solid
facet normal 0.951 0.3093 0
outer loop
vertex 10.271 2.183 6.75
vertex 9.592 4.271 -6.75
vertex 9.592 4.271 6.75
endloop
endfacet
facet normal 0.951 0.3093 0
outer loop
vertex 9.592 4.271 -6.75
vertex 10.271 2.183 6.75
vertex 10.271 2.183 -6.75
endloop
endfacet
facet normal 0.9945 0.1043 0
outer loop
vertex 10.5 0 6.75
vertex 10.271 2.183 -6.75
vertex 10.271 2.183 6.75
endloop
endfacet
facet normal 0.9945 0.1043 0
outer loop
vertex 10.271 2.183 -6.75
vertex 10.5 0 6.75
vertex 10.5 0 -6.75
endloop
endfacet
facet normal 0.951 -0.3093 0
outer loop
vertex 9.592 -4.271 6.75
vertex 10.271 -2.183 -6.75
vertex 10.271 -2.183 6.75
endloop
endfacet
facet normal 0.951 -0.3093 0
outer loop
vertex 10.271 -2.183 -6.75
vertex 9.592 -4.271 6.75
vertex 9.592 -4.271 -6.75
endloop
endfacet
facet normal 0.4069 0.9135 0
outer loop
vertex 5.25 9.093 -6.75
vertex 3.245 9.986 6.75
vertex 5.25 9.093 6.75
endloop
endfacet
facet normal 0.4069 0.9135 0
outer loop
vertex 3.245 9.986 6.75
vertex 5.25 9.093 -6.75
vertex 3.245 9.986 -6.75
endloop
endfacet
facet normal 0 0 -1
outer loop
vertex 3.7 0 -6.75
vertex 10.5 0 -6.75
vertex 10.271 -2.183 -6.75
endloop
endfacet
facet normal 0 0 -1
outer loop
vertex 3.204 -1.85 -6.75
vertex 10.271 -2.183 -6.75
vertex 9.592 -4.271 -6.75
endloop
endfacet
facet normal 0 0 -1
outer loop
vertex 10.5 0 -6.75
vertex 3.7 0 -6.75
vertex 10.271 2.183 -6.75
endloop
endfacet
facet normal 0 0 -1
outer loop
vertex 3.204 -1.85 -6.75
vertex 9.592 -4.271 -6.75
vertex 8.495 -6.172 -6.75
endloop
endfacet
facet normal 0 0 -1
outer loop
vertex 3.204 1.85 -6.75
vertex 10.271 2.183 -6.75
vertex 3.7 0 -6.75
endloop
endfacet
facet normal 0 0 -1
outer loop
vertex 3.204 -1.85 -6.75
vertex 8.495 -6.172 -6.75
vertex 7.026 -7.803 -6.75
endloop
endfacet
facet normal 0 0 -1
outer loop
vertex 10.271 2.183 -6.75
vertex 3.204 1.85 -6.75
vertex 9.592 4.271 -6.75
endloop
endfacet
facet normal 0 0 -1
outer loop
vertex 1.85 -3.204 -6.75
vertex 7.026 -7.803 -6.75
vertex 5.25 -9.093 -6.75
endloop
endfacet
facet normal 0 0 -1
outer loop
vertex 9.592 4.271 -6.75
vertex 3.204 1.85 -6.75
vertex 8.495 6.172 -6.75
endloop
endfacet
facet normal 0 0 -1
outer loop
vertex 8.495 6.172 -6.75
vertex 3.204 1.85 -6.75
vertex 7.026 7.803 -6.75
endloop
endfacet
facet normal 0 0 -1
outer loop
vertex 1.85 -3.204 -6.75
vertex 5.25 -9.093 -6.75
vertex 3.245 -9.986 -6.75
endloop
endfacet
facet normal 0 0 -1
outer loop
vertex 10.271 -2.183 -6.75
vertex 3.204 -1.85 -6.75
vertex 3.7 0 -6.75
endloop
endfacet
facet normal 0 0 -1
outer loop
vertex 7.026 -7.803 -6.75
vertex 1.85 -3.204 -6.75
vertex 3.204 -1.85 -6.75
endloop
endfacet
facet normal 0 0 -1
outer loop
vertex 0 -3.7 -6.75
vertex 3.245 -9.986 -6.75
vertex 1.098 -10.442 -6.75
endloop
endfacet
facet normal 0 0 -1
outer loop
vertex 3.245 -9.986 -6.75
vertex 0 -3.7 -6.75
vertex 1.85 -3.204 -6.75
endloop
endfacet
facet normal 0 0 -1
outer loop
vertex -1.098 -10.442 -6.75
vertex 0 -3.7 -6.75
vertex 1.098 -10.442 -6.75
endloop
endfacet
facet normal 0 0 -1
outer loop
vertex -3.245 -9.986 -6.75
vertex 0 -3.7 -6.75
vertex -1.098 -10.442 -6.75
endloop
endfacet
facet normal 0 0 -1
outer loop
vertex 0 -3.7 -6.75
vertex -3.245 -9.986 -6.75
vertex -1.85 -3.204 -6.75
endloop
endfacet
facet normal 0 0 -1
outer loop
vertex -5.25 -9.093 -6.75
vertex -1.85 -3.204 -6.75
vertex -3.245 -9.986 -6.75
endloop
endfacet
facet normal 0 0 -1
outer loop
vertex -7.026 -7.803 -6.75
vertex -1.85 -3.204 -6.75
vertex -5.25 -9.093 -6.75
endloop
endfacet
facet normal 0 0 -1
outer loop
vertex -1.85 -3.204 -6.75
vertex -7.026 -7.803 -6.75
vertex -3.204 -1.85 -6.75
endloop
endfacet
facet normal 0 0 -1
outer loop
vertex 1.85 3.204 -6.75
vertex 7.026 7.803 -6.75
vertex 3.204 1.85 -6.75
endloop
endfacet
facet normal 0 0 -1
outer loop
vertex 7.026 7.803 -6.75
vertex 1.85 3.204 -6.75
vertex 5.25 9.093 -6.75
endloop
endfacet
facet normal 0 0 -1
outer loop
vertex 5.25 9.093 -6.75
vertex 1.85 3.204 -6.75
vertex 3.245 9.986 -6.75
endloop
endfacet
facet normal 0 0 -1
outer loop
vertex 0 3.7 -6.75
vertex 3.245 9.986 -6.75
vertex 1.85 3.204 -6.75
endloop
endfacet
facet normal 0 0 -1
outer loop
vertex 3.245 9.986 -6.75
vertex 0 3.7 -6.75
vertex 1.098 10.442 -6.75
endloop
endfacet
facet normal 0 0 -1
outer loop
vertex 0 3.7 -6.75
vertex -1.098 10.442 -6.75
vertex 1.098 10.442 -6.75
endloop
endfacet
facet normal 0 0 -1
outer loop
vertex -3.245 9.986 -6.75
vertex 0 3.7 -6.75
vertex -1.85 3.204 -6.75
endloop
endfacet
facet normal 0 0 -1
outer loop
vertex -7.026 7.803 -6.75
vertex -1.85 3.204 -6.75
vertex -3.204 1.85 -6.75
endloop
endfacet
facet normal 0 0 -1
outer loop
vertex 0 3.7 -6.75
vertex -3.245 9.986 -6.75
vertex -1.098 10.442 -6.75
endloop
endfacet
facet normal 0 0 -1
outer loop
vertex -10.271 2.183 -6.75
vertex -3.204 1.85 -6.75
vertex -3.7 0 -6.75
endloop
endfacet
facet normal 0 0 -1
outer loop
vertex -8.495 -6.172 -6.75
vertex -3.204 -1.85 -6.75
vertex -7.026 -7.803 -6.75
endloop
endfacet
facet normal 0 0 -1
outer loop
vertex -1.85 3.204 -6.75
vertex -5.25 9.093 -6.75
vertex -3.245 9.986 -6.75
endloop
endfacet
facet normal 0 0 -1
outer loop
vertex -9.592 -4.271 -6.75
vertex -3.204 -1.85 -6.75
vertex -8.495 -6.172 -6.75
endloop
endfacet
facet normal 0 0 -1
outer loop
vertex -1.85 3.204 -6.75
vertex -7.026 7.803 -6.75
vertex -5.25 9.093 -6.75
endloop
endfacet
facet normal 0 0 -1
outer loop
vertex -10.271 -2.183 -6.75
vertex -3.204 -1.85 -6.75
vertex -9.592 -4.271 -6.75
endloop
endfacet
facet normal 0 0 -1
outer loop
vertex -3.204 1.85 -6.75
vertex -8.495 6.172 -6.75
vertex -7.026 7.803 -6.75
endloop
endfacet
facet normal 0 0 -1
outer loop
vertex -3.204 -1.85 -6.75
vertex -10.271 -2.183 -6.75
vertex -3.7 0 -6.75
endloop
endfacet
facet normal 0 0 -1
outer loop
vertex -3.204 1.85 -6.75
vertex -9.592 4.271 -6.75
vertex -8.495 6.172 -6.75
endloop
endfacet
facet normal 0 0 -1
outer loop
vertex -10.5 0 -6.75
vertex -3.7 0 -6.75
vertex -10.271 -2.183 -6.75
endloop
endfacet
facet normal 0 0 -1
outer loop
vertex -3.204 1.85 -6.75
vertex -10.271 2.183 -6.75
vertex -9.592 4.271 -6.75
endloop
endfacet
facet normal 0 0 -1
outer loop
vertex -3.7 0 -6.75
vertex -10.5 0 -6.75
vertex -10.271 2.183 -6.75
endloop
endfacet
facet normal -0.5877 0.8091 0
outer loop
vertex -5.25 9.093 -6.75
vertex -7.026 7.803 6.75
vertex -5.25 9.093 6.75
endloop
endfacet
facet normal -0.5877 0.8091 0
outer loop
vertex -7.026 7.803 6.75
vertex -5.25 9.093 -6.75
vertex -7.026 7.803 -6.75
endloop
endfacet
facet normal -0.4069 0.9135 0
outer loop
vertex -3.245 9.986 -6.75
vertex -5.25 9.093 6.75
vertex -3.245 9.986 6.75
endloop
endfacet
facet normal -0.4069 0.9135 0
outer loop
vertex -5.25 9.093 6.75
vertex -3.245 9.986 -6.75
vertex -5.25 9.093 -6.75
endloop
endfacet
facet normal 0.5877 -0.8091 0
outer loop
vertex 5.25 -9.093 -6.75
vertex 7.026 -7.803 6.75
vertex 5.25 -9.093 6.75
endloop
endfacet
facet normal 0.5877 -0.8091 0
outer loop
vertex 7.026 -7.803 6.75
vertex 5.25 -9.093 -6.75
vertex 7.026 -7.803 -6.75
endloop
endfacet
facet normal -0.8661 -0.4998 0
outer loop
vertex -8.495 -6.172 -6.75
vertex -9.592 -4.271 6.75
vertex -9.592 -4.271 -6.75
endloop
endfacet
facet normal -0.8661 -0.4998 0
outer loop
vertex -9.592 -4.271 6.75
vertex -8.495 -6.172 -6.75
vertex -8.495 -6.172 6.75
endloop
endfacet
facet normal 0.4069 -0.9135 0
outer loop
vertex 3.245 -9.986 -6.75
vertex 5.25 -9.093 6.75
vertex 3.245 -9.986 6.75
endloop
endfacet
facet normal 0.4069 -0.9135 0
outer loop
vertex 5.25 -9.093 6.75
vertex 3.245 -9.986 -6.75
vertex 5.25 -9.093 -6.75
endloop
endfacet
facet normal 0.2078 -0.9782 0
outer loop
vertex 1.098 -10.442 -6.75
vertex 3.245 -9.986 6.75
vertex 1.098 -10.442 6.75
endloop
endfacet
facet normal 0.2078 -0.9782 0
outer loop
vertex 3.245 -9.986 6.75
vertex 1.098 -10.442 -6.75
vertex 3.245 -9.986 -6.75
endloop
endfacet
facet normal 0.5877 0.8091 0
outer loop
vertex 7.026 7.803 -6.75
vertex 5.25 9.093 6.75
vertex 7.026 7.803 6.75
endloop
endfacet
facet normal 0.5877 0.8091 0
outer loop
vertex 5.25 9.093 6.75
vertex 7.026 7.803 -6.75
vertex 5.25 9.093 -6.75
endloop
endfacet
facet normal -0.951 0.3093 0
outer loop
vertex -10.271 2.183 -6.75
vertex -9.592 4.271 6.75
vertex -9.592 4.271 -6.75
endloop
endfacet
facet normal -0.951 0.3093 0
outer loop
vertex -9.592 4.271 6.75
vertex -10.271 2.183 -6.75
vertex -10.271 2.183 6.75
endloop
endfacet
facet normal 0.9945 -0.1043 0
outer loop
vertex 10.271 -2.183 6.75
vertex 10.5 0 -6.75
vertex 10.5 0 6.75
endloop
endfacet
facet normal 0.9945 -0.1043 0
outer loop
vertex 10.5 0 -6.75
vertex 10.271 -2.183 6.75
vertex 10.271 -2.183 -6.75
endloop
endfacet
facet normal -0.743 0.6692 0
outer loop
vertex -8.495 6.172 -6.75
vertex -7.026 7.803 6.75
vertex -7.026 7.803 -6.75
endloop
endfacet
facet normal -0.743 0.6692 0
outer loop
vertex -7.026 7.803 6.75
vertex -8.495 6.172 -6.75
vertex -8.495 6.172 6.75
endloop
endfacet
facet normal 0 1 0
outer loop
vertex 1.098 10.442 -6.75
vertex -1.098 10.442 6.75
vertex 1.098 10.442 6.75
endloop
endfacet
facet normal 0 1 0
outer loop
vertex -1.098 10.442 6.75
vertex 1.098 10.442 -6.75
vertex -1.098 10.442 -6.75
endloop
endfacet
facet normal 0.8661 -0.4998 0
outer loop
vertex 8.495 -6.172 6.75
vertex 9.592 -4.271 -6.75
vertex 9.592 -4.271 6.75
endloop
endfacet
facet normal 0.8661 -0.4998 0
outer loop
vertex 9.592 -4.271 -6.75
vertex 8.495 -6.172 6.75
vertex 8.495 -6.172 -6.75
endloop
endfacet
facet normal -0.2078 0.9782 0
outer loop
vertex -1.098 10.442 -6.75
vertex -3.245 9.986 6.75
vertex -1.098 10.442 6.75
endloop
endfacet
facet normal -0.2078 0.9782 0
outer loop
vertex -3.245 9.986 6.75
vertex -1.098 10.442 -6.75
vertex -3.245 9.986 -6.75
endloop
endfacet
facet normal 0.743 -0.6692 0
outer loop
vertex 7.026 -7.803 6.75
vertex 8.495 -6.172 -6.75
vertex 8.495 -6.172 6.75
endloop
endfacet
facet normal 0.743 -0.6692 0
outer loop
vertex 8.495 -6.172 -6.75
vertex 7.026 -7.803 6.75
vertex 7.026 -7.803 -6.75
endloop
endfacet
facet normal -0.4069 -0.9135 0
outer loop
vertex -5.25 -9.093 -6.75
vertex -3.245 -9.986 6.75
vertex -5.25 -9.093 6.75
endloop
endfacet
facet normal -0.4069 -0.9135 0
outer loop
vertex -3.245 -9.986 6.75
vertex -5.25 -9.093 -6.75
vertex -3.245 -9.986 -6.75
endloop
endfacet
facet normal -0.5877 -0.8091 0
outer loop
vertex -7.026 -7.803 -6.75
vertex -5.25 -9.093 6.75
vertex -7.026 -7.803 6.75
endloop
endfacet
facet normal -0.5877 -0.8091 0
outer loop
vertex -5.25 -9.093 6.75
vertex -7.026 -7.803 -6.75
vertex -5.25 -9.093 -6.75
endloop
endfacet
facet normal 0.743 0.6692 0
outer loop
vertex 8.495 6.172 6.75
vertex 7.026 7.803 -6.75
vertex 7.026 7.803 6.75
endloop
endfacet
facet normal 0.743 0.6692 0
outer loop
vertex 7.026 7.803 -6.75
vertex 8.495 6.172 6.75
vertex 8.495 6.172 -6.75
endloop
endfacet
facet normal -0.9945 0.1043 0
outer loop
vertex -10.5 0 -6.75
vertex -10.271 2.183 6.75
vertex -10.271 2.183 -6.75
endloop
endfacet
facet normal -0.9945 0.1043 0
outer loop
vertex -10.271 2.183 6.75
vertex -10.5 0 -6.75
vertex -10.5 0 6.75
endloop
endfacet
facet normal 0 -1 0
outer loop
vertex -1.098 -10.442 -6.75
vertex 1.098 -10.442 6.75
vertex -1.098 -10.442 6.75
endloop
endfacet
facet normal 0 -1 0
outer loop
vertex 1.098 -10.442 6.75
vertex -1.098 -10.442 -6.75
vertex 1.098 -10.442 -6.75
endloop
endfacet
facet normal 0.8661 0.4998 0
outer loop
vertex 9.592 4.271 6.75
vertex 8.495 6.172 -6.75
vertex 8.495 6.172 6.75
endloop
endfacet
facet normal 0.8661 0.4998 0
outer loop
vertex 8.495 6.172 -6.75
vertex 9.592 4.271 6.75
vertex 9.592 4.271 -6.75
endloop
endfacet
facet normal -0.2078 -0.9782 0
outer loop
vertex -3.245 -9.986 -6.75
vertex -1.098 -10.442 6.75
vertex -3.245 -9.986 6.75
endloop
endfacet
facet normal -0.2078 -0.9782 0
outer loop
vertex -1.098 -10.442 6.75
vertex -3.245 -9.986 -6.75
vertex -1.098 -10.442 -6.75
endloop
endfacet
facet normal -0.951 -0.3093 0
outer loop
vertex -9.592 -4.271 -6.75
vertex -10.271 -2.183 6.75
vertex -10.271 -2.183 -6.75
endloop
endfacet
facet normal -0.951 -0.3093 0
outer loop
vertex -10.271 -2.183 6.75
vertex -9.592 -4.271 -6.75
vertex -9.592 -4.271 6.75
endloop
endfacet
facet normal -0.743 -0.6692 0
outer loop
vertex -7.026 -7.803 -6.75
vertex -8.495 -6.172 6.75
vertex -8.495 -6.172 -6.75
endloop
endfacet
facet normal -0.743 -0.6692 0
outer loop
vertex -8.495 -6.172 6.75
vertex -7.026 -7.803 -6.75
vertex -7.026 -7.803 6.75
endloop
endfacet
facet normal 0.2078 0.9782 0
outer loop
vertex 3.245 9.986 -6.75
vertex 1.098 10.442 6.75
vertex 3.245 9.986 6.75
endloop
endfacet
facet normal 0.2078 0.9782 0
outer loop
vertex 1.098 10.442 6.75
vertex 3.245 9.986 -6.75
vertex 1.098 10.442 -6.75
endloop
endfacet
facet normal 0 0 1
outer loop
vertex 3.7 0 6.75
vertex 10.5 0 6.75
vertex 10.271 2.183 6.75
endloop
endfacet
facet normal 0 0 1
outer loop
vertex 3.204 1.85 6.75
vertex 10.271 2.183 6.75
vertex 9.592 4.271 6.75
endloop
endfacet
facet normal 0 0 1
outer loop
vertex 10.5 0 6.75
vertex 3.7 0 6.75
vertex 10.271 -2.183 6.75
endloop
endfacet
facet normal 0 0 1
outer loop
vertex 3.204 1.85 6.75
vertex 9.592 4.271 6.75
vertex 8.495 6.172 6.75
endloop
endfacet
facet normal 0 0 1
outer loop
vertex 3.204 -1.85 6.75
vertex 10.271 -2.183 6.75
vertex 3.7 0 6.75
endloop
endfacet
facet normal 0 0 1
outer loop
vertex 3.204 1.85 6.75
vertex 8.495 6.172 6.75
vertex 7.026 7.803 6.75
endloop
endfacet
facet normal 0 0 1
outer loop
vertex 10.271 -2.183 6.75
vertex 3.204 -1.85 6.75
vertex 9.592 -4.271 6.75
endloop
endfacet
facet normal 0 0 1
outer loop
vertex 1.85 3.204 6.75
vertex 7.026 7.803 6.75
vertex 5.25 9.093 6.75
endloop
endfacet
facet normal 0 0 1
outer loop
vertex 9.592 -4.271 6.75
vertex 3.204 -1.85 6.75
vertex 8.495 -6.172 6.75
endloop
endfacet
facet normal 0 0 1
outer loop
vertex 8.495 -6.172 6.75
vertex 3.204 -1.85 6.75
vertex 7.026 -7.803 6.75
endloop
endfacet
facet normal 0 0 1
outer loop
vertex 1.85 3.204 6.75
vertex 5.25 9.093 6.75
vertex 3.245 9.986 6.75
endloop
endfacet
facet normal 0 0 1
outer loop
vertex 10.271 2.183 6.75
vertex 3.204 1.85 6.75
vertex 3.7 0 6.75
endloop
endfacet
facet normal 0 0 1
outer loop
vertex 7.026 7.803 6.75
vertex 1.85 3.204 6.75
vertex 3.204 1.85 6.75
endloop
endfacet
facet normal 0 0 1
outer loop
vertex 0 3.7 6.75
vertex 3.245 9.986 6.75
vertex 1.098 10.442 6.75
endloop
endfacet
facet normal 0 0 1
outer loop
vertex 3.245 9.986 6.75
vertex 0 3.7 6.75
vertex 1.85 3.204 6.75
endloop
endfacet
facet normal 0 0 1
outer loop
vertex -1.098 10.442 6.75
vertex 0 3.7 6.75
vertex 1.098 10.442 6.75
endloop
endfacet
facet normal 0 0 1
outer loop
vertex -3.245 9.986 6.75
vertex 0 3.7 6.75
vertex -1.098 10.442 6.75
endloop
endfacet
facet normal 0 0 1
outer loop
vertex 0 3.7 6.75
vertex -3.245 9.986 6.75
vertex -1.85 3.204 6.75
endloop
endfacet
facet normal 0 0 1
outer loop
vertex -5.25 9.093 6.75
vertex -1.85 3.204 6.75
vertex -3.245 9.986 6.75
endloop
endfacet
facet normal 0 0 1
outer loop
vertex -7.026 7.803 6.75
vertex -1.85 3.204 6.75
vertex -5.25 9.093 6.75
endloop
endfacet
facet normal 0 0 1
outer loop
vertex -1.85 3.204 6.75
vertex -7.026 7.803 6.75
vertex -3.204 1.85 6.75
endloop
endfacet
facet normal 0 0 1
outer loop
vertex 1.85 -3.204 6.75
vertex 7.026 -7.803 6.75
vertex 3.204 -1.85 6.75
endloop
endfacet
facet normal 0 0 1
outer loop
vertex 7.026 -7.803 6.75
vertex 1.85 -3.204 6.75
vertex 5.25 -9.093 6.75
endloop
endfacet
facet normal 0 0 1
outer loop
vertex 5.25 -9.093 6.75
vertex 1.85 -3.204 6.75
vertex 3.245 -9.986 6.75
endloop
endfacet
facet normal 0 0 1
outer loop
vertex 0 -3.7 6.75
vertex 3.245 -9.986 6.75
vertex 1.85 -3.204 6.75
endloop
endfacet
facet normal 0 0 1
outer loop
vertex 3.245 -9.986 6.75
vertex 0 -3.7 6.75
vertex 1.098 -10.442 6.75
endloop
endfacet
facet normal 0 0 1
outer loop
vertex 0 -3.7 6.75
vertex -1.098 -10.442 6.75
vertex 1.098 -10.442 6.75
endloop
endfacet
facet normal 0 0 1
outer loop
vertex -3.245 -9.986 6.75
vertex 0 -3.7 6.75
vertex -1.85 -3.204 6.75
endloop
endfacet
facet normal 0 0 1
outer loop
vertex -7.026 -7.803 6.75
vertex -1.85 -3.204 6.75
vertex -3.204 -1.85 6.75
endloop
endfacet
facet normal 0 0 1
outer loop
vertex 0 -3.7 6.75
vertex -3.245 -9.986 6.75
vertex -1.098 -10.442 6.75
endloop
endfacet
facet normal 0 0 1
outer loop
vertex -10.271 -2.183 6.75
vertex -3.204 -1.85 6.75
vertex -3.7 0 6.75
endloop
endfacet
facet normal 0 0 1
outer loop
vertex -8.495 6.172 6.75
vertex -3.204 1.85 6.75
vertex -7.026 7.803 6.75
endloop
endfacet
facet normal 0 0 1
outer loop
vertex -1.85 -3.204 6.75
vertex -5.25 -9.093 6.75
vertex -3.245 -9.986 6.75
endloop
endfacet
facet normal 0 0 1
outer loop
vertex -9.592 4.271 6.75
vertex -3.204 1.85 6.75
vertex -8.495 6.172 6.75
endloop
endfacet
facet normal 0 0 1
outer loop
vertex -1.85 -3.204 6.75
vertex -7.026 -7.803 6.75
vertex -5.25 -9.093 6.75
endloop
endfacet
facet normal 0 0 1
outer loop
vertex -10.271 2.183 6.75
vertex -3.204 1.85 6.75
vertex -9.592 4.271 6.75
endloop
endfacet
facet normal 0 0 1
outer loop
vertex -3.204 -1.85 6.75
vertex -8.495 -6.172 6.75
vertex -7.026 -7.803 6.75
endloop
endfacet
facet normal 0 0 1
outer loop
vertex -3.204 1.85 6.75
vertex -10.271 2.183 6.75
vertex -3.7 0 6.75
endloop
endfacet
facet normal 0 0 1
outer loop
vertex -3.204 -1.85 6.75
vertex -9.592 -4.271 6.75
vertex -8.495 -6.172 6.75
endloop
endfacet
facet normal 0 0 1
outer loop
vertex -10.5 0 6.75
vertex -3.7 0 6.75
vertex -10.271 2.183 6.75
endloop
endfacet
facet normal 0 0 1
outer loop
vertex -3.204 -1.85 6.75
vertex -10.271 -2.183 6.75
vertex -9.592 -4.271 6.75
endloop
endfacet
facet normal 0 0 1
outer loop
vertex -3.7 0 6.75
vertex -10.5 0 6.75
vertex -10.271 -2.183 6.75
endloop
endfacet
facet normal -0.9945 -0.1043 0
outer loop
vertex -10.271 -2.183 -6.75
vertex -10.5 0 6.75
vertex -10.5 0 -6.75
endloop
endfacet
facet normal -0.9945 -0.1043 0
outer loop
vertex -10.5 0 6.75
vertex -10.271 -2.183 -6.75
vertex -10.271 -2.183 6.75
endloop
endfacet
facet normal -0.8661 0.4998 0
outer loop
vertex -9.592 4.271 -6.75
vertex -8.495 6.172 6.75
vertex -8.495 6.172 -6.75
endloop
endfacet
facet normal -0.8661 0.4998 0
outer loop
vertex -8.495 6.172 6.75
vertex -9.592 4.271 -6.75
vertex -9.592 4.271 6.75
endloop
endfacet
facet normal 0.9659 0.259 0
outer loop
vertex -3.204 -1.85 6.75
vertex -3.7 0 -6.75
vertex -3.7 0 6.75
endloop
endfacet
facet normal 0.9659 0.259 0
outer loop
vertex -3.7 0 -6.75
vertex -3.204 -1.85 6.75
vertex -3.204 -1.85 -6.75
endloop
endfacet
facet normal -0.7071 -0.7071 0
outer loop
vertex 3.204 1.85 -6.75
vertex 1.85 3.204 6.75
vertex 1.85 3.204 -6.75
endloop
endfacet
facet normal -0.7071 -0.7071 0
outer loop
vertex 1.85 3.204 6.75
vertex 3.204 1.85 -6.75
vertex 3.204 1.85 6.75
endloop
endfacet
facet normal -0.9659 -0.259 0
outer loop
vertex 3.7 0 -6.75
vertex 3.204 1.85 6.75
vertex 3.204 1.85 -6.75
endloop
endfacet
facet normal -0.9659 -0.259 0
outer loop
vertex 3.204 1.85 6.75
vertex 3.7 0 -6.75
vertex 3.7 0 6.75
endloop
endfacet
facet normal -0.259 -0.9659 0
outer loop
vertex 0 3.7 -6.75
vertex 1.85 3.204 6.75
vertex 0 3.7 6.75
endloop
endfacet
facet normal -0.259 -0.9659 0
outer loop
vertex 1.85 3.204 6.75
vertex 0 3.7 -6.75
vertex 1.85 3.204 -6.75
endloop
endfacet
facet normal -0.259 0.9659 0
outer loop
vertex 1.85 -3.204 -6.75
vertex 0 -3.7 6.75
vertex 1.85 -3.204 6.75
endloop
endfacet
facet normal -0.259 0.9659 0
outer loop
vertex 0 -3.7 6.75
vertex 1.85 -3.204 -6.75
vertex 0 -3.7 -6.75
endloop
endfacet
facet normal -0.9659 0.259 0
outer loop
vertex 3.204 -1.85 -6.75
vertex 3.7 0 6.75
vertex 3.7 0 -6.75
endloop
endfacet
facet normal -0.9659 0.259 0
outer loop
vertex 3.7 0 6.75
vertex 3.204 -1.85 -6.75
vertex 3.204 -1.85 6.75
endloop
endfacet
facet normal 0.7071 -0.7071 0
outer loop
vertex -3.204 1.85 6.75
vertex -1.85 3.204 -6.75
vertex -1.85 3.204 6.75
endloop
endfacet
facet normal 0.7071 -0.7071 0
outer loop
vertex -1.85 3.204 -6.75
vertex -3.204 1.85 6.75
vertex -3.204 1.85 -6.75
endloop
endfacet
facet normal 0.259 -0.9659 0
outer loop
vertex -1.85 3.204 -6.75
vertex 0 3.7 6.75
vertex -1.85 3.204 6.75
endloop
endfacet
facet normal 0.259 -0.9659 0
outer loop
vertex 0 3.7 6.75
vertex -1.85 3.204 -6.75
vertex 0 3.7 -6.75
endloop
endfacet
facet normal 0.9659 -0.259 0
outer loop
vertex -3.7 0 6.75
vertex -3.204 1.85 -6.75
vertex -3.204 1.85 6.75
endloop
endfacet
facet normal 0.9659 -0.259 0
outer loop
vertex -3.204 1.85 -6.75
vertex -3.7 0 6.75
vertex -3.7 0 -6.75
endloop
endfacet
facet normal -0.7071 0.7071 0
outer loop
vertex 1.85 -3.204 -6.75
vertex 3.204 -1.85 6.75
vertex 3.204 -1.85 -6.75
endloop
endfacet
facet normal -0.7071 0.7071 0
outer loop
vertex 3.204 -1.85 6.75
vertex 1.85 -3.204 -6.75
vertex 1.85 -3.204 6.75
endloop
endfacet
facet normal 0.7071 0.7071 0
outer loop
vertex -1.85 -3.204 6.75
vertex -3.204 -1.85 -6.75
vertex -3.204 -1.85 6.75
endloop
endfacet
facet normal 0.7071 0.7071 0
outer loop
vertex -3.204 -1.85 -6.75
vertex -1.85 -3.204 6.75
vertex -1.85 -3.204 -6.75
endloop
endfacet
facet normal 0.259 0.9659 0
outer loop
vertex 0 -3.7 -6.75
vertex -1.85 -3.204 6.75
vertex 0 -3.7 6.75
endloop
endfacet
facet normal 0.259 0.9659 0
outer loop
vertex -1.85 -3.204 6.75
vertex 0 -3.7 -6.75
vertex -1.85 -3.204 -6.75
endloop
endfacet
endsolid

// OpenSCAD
// Parameters
outer_radius = 10.5; //[5.25:21:0.1]
inner_radius = 3.7; //[1.85:7.4:0.1]
height = 13.5; //[6.75:27:0.1]

// Geometry
module outer_cylinder() {
  cylinder(h=height, r=outer_radius, center=true);
}

module inner_bore() {
  cylinder(h=height + 2, r=inner_radius, center=true);
}

// Main Body
module main_body() {
  difference() {
    outer_cylinder();
    inner_bore();
  }
}

// Final Output
color("Silver") main_body();
